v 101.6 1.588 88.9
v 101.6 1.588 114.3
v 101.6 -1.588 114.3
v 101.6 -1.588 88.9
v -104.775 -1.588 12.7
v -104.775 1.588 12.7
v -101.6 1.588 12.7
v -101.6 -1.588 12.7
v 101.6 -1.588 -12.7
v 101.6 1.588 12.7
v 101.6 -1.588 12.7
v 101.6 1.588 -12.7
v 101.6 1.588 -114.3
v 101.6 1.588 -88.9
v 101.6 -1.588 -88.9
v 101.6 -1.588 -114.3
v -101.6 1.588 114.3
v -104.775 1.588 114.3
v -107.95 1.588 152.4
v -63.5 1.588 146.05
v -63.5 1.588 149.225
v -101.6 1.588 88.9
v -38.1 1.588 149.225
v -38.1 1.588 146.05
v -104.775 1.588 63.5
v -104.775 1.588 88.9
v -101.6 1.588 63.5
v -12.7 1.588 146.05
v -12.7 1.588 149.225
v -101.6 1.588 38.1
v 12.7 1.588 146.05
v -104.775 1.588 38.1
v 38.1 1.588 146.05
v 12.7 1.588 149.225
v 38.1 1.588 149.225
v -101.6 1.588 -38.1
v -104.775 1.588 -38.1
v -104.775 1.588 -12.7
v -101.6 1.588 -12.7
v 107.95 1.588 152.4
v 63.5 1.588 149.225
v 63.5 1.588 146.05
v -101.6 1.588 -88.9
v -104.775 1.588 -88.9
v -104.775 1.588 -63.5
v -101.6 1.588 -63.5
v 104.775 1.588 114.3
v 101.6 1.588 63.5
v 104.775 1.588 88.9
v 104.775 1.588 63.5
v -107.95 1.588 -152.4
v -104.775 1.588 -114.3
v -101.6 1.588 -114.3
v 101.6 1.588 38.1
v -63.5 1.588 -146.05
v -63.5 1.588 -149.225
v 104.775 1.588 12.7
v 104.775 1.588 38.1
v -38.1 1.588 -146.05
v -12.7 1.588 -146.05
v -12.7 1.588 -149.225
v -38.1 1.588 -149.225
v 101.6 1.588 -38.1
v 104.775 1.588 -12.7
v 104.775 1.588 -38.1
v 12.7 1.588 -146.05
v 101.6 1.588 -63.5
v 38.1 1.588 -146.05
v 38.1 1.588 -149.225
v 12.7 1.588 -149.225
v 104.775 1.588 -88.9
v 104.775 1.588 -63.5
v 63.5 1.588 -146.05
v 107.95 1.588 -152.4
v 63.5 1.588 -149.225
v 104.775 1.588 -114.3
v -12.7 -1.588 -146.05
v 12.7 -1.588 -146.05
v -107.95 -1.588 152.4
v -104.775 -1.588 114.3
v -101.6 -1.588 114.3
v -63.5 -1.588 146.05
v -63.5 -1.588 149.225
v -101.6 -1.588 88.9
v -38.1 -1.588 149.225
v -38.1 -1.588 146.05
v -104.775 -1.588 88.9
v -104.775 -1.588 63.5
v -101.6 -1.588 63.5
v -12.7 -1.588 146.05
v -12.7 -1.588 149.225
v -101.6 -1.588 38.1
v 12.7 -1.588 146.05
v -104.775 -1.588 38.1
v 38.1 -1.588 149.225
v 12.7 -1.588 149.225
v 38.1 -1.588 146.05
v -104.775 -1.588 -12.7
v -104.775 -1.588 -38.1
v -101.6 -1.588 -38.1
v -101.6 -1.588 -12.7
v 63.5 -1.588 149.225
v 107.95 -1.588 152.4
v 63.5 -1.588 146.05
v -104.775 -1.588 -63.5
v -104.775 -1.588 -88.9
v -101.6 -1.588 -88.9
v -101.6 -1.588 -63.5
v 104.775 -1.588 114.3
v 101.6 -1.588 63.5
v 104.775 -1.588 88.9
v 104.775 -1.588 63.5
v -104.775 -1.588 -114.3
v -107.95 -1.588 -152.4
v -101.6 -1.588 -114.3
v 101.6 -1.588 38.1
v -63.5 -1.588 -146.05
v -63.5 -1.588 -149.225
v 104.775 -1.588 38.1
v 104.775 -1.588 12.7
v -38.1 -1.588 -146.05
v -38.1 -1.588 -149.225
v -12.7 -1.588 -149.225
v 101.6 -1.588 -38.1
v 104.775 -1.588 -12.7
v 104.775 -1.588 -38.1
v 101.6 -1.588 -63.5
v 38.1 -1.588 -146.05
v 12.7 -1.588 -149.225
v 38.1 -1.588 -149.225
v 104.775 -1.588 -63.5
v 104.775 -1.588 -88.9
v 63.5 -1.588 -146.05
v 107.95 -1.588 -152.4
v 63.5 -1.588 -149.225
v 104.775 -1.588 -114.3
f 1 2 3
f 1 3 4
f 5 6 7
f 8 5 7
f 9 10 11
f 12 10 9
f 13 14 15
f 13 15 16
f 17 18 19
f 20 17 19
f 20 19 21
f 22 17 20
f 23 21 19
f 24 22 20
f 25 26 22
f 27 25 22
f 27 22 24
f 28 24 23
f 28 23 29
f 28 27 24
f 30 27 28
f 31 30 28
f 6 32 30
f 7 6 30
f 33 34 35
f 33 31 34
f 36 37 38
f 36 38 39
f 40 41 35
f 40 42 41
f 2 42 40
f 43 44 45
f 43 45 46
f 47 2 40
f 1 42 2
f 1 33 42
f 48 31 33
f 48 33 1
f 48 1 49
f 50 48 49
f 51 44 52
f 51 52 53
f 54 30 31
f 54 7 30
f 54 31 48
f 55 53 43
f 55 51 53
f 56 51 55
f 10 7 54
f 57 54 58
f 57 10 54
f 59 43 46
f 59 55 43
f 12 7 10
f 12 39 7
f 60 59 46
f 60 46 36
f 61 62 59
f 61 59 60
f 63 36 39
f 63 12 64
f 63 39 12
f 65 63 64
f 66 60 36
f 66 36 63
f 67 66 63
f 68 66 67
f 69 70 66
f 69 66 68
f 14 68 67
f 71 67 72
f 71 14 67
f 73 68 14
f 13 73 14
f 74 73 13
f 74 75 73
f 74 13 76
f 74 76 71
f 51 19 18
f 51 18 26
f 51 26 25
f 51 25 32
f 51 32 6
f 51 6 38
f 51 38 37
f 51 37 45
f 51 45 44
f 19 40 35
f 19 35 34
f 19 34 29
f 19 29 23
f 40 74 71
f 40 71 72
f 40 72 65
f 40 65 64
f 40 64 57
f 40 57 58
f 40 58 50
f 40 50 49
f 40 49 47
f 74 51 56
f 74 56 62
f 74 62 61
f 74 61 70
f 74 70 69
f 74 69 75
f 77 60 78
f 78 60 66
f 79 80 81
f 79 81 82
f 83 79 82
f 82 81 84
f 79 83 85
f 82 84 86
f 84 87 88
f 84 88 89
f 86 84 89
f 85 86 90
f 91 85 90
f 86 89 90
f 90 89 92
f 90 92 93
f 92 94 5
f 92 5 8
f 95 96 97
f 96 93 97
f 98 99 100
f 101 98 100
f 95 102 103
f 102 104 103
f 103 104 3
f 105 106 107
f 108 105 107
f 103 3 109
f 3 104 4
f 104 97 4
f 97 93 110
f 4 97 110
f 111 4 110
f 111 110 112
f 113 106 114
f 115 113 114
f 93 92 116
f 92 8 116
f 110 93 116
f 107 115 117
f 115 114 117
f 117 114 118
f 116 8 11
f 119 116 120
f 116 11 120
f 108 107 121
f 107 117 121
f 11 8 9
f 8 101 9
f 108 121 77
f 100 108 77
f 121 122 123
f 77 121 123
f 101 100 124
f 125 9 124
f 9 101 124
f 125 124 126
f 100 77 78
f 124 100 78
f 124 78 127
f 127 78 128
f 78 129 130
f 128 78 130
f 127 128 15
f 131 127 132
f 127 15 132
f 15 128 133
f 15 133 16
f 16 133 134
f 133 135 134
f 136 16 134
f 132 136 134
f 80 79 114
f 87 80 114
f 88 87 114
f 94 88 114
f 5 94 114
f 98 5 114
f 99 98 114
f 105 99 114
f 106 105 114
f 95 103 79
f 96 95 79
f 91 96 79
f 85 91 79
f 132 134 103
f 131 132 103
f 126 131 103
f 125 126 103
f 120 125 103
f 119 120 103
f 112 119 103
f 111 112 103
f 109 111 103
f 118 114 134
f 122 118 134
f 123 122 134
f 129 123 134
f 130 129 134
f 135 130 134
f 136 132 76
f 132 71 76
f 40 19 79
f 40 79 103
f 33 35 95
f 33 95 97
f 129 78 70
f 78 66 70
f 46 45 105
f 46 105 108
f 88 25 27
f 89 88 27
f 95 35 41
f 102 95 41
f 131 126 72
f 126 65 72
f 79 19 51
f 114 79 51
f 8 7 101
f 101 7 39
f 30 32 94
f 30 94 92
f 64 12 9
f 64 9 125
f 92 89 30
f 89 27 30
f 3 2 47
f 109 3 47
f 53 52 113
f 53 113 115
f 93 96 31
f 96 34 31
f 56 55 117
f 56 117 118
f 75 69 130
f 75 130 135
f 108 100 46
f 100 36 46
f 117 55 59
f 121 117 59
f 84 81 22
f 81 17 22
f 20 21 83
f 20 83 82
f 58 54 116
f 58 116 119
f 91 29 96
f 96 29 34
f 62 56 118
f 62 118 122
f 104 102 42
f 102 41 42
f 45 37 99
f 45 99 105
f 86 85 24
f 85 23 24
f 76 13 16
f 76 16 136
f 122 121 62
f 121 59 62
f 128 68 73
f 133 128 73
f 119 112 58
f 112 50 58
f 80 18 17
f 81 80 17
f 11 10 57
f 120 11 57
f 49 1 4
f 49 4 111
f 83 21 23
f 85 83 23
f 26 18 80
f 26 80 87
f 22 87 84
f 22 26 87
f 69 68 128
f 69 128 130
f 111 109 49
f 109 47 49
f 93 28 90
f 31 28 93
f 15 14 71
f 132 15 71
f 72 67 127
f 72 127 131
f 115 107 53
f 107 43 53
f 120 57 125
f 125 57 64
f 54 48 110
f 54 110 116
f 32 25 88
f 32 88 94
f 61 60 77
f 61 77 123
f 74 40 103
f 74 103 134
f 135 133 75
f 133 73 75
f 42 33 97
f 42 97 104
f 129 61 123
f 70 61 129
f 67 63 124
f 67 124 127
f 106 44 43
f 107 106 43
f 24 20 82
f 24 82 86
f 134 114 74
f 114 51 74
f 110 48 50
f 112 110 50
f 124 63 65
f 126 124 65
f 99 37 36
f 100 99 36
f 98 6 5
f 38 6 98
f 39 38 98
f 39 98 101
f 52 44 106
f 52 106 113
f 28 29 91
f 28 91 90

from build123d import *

# Parameters (mm, degrees)
SKETCH1_W           = 215.9
SKETCH1_H           = 304.8
SKETCH1_W_2         = 25.4
SKETCH1_H_2         = 3.175
SKETCH1_W_3         = 3.175
SKETCH1_H_3         = 25.4
BOSS_EXTRUDE1_DEPTH = 1.5875


with BuildPart() as part:
    # Sketch1 → Boss-Extrude1 (new body, symmetric)
    with BuildSketch(Plane(origin=(0, 0, 0), x_dir=(1, 0, 0), z_dir=(0, 1, 0))):
        Rectangle(SKETCH1_W, SKETCH1_H)
        with Locations((0, 147.6375)):
            Rectangle(SKETCH1_W_2, SKETCH1_H_2, mode=Mode.SUBTRACT)
        with Locations((50.8, 147.6375)):
            Rectangle(SKETCH1_W_2, SKETCH1_H_2, mode=Mode.SUBTRACT)
        with Locations((-50.8, 147.6375)):
            Rectangle(SKETCH1_W_2, SKETCH1_H_2, mode=Mode.SUBTRACT)
        with Locations((-50.8, -147.6375)):
            Rectangle(SKETCH1_W_2, SKETCH1_H_2, mode=Mode.SUBTRACT)
        with Locations((0, -147.6375)):
            Rectangle(SKETCH1_W_2, SKETCH1_H_2, mode=Mode.SUBTRACT)
        with Locations((50.8, -147.6375)):
            Rectangle(SKETCH1_W_2, SKETCH1_H_2, mode=Mode.SUBTRACT)
        with Locations((103.1875, 0)):
            Rectangle(SKETCH1_W_3, SKETCH1_H_3, mode=Mode.SUBTRACT)
        with Locations((103.1875, 50.8)):
            Rectangle(SKETCH1_W_3, SKETCH1_H_3, mode=Mode.SUBTRACT)
        with Locations((103.1875, 101.6)):
            Rectangle(SKETCH1_W_3, SKETCH1_H_3, mode=Mode.SUBTRACT)
        with Locations((103.1875, -50.8)):
            Rectangle(SKETCH1_W_3, SKETCH1_H_3, mode=Mode.SUBTRACT)
        with Locations((103.1875, -101.6)):
            Rectangle(SKETCH1_W_3, SKETCH1_H_3, mode=Mode.SUBTRACT)
        with Locations((-103.1875, 101.6)):
            Rectangle(SKETCH1_W_3, SKETCH1_H_3, mode=Mode.SUBTRACT)
        with Locations((-103.1875, 50.8)):
            Rectangle(SKETCH1_W_3, SKETCH1_H_3, mode=Mode.SUBTRACT)
        with Locations((-103.1875, 0)):
            Rectangle(SKETCH1_W_3, SKETCH1_H_3, mode=Mode.SUBTRACT)
        with Locations((-103.1875, -50.8)):
            Rectangle(SKETCH1_W_3, SKETCH1_H_3, mode=Mode.SUBTRACT)
        with Locations((-103.1875, -101.6)):
            Rectangle(SKETCH1_W_3, SKETCH1_H_3, mode=Mode.SUBTRACT)
    extrude(amount=BOSS_EXTRUDE1_DEPTH, both=True)


solid = part.part
